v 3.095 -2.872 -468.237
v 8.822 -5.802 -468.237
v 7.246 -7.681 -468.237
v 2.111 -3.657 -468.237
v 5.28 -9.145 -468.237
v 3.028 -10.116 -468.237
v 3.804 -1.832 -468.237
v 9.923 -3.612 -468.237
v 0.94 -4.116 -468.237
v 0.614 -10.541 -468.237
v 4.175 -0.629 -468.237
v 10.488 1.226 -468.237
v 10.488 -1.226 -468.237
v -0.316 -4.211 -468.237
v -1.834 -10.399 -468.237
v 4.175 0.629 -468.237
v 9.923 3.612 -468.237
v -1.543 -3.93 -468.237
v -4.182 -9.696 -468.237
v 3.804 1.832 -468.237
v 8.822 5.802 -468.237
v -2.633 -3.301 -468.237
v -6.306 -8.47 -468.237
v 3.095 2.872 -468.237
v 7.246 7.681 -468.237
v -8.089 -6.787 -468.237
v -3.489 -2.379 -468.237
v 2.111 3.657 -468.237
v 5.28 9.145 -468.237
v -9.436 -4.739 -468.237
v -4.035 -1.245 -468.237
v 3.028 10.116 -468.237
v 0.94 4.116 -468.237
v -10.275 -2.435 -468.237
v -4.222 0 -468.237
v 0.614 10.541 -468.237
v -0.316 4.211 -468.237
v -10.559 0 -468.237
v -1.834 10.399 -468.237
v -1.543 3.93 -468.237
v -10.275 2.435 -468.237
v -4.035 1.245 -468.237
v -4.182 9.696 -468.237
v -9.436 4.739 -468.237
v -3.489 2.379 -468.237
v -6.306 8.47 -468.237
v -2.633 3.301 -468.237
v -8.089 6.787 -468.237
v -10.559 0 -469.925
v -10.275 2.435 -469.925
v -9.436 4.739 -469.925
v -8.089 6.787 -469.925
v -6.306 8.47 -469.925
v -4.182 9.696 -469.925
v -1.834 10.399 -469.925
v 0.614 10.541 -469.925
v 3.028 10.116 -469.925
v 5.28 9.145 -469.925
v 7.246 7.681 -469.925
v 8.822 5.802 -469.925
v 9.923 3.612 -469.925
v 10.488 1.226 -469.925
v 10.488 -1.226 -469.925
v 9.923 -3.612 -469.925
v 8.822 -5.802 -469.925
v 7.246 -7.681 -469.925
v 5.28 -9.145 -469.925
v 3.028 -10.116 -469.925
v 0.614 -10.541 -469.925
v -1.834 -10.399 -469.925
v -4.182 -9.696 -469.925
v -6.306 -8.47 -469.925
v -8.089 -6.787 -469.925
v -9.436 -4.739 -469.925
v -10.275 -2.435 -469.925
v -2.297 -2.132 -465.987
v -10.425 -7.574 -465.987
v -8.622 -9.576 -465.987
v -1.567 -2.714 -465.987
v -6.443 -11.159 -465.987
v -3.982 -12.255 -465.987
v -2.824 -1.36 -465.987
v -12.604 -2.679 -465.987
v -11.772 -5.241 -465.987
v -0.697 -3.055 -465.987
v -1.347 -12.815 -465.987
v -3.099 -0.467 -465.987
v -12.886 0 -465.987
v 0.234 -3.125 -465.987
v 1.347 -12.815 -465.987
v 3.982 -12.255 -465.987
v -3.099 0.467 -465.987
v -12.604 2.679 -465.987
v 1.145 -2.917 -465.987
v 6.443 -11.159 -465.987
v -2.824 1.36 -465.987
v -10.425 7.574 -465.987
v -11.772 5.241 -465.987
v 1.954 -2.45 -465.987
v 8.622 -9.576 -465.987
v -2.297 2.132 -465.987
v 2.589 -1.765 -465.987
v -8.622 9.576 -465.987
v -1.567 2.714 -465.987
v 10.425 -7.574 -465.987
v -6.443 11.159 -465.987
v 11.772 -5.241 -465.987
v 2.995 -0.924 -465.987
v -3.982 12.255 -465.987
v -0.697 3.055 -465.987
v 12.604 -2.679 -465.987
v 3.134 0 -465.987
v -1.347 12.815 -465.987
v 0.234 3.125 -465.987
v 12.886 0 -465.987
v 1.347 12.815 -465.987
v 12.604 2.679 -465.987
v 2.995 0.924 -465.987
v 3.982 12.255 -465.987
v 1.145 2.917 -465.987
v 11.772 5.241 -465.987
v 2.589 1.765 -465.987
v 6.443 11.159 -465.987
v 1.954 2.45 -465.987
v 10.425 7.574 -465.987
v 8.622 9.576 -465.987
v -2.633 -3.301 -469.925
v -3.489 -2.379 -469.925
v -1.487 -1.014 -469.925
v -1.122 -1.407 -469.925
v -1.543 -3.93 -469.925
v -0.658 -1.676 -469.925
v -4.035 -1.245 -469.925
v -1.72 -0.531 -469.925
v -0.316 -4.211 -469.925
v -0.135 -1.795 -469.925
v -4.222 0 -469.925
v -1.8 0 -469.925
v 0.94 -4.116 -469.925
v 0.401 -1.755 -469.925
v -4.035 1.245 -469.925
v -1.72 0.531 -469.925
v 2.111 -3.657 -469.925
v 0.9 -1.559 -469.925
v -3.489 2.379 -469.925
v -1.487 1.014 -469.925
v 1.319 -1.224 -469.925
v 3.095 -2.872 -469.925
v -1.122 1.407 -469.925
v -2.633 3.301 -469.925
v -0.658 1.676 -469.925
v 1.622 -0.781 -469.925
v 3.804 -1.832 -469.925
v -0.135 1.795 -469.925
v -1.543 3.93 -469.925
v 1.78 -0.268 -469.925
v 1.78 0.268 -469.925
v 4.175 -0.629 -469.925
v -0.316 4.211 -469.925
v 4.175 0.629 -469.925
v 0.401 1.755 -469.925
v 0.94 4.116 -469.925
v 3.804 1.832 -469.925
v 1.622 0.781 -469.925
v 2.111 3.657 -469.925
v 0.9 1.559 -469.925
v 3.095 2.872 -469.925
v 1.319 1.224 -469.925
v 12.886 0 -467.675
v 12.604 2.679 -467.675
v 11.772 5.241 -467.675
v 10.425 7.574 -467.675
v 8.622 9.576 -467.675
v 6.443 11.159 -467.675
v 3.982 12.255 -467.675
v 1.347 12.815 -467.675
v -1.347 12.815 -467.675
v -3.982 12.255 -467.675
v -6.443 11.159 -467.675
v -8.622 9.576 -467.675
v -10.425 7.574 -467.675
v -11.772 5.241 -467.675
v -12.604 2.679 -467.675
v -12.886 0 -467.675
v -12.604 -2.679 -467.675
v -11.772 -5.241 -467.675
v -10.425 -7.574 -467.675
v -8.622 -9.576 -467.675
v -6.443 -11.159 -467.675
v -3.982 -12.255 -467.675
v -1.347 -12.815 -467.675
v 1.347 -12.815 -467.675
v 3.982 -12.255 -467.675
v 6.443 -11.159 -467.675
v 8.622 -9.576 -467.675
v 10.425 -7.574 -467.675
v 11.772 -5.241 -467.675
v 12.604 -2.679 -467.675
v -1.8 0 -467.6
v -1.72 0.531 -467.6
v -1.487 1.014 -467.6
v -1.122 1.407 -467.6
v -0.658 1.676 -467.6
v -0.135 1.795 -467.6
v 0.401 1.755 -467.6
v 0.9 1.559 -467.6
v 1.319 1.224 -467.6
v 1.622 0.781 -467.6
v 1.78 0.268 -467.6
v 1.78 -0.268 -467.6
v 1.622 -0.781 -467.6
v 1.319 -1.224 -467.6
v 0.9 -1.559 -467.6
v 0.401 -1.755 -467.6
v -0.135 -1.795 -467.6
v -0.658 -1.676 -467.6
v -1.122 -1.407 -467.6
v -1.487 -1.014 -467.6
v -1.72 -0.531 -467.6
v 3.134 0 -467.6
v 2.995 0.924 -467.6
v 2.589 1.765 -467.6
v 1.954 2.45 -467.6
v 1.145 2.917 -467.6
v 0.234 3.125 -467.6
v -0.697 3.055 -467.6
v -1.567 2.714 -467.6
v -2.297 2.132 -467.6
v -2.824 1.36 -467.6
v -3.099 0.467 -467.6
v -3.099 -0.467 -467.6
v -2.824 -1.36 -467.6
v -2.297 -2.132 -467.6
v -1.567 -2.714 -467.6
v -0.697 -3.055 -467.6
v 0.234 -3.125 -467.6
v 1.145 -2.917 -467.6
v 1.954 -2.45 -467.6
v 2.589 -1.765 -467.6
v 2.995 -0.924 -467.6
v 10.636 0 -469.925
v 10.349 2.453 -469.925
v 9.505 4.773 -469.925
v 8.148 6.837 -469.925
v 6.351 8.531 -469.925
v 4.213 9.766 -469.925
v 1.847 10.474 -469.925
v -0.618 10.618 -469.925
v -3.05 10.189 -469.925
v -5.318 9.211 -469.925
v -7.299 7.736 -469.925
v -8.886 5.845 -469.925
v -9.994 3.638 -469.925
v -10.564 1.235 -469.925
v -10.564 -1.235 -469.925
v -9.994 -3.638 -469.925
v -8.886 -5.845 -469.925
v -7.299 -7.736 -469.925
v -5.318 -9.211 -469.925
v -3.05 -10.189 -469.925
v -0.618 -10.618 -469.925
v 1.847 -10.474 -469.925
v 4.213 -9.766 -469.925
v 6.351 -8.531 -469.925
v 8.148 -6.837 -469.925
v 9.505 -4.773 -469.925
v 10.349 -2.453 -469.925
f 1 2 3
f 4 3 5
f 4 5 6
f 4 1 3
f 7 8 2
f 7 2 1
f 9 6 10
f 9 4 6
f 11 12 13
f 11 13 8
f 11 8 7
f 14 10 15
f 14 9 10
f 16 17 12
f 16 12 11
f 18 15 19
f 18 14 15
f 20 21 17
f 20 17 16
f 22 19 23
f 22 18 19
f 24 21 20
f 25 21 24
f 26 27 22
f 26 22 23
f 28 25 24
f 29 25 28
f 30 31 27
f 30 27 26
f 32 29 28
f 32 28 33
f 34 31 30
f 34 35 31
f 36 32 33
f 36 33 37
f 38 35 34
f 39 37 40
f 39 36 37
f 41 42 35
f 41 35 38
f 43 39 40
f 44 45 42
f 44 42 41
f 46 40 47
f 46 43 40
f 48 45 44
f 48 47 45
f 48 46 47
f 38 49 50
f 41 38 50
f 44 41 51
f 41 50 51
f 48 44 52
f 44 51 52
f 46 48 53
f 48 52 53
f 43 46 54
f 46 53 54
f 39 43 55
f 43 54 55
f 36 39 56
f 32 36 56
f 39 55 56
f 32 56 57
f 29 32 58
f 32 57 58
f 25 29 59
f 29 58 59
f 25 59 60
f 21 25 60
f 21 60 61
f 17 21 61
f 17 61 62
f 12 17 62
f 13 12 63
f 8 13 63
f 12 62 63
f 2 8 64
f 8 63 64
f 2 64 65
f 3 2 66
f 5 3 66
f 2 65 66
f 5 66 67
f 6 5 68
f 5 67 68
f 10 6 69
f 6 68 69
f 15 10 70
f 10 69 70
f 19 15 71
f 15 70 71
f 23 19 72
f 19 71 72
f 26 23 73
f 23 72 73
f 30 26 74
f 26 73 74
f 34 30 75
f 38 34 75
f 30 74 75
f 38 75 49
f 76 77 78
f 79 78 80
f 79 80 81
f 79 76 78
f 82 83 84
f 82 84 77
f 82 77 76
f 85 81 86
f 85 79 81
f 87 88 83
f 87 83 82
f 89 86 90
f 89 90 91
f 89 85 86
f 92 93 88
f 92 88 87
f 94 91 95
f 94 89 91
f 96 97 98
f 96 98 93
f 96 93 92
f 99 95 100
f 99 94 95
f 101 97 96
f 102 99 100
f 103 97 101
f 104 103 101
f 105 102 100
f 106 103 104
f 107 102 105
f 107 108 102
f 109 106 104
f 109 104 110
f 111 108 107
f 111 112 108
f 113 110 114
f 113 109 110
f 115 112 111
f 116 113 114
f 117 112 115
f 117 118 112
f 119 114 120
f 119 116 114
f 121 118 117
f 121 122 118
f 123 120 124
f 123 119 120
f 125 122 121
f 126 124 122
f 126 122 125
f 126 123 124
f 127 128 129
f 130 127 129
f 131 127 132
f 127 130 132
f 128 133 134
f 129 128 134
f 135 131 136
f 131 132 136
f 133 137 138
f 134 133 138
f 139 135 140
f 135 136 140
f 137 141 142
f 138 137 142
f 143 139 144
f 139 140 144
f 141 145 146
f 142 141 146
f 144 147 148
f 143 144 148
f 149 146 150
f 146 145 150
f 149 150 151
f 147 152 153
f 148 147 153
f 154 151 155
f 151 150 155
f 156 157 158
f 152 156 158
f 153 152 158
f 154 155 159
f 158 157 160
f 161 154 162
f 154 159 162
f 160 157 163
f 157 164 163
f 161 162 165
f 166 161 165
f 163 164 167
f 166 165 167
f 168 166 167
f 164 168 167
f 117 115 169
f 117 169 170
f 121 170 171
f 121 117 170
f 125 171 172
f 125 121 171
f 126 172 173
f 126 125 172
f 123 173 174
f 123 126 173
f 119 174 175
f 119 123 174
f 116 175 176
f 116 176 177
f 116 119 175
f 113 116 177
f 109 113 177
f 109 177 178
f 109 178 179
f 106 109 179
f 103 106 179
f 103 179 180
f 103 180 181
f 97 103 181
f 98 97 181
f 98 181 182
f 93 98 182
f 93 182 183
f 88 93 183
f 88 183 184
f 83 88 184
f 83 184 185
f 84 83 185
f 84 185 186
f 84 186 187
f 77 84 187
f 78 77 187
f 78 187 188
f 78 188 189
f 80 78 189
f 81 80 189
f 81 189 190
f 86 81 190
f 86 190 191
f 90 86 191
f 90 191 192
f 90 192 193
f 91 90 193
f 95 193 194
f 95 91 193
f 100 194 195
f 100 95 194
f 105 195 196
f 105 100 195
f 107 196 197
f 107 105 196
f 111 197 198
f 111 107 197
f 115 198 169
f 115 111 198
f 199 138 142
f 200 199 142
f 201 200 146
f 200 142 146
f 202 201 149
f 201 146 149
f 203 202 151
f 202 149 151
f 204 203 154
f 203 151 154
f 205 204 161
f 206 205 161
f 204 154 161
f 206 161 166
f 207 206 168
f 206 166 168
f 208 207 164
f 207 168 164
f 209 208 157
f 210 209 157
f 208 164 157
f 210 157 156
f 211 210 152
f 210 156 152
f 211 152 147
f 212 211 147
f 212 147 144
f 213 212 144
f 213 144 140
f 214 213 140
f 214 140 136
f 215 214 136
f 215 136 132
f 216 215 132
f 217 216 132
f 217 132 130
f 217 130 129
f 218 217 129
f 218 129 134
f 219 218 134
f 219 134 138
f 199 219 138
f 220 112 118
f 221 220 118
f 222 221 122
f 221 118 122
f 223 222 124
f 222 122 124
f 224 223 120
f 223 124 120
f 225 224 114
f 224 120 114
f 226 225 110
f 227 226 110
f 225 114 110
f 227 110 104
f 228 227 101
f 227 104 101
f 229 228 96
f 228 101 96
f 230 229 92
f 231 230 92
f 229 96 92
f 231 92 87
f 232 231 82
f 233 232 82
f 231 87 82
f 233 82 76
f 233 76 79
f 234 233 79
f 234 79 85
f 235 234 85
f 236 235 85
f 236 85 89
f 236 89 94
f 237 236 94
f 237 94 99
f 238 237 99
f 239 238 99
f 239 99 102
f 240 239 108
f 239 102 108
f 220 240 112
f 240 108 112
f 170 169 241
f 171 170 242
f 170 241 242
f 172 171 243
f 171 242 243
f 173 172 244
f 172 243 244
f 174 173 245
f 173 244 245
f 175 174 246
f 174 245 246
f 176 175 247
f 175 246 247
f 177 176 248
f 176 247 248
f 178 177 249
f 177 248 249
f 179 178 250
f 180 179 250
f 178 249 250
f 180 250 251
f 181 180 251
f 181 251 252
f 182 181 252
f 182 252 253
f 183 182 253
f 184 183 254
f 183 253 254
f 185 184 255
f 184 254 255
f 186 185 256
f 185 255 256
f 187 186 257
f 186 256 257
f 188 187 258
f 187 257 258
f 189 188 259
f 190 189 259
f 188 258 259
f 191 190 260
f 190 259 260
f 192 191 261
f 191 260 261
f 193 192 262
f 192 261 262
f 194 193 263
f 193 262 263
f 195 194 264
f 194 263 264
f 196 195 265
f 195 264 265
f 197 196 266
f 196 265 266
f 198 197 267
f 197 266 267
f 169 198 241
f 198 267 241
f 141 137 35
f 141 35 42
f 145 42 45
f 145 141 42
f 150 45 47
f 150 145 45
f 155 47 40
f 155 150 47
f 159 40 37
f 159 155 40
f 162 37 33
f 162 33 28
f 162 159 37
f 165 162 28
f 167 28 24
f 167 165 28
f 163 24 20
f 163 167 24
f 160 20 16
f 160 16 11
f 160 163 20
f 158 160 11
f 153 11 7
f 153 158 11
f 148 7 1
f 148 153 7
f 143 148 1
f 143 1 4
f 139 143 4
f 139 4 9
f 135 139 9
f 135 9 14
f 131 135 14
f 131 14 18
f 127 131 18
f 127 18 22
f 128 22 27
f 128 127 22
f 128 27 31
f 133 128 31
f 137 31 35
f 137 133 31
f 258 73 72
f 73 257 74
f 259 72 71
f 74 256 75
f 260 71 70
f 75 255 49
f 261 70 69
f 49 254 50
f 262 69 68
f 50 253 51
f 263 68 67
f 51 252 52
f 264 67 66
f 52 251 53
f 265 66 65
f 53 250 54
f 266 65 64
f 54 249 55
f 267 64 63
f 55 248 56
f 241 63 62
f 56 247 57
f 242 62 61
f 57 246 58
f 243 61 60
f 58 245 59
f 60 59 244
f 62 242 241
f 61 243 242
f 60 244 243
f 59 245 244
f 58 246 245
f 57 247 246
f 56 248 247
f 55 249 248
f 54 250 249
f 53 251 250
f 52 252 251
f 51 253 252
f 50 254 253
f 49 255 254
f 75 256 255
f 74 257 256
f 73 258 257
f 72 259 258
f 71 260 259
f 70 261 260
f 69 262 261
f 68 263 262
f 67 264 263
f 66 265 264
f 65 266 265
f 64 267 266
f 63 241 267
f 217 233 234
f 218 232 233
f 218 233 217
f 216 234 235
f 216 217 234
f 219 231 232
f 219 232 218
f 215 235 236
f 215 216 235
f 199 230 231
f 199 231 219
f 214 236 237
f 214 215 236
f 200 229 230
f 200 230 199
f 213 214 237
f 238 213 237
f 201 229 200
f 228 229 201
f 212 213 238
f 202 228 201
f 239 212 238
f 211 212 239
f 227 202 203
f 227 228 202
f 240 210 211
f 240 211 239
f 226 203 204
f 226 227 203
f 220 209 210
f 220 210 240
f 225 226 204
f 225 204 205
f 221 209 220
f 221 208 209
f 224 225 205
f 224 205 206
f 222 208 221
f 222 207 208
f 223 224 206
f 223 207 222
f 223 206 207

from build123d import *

# Parameters (mm, degrees)
SKETCH2_R                = 17.181172962
BOSS_EXTRUDE1_DEPTH      = 1.25
BOSS_EXTRUDE1_DEPTH_BACK = 4
SKETCH3_R                = 14.079134115
SKETCH3_R_2              = 5.629774077
CUT_EXTRUDE1_DEPTH       = 2.25
SKETCH4_R                = 2.4
CUT_EXTRUDE2_DEPTH       = 12.25
SKETCH5_R                = 4.178678746
CUT_EXTRUDE3_DEPTH       = 2.15
CHAMFER1_SIZE            = 3
SCALE2_SCALE             = 0.75


with BuildPart() as part:
    # Sketch2 → Boss-Extrude1 (new body, two sides)
    with BuildSketch(Plane.XY.offset(-466.775167308)) as boss_extrude1_sk:
        Circle(SKETCH2_R)
    extrude(amount=BOSS_EXTRUDE1_DEPTH)
    extrude(boss_extrude1_sk.sketch, amount=-BOSS_EXTRUDE1_DEPTH_BACK)

    # Sketch3 → Cut-Extrude1 (cut)
    with BuildSketch(Plane(origin=(0, 0, -470.775167308), x_dir=(-1, 0, 0), z_dir=(0, 0, -1))):
        Circle(SKETCH3_R)
        Circle(SKETCH3_R_2, mode=Mode.SUBTRACT)
    extrude(amount=-CUT_EXTRUDE1_DEPTH, mode=Mode.SUBTRACT)

    # Sketch4 → Cut-Extrude2 (cut)
    with BuildSketch(Plane(origin=(0, 0, -470.775167308), x_dir=(-1, 0, 0), z_dir=(0, 0, -1))):
        Circle(SKETCH4_R)
    extrude(amount=-CUT_EXTRUDE2_DEPTH, mode=Mode.SUBTRACT)

    # Sketch5 → Cut-Extrude3 (cut)
    with BuildSketch(Plane.XY.offset(-465.525167308)):
        Circle(SKETCH5_R)
    extrude(amount=-CUT_EXTRUDE3_DEPTH, mode=Mode.SUBTRACT)

    # Chamfer1
    chamfer1_edges = [part.edges().sort_by_distance(p)[0] for p in [
        (-17.181172962, 0, -470.775167308),
    ]]
    chamfer(chamfer1_edges, length=CHAMFER1_SIZE)


with BuildPart() as part_1:
    # Scale2: scaled about (0, 0, -467.372549258)
    add(part.part.scale(SCALE2_SCALE).moved(Location((0, 0, -116.843137314))))


solid = part_1.part
